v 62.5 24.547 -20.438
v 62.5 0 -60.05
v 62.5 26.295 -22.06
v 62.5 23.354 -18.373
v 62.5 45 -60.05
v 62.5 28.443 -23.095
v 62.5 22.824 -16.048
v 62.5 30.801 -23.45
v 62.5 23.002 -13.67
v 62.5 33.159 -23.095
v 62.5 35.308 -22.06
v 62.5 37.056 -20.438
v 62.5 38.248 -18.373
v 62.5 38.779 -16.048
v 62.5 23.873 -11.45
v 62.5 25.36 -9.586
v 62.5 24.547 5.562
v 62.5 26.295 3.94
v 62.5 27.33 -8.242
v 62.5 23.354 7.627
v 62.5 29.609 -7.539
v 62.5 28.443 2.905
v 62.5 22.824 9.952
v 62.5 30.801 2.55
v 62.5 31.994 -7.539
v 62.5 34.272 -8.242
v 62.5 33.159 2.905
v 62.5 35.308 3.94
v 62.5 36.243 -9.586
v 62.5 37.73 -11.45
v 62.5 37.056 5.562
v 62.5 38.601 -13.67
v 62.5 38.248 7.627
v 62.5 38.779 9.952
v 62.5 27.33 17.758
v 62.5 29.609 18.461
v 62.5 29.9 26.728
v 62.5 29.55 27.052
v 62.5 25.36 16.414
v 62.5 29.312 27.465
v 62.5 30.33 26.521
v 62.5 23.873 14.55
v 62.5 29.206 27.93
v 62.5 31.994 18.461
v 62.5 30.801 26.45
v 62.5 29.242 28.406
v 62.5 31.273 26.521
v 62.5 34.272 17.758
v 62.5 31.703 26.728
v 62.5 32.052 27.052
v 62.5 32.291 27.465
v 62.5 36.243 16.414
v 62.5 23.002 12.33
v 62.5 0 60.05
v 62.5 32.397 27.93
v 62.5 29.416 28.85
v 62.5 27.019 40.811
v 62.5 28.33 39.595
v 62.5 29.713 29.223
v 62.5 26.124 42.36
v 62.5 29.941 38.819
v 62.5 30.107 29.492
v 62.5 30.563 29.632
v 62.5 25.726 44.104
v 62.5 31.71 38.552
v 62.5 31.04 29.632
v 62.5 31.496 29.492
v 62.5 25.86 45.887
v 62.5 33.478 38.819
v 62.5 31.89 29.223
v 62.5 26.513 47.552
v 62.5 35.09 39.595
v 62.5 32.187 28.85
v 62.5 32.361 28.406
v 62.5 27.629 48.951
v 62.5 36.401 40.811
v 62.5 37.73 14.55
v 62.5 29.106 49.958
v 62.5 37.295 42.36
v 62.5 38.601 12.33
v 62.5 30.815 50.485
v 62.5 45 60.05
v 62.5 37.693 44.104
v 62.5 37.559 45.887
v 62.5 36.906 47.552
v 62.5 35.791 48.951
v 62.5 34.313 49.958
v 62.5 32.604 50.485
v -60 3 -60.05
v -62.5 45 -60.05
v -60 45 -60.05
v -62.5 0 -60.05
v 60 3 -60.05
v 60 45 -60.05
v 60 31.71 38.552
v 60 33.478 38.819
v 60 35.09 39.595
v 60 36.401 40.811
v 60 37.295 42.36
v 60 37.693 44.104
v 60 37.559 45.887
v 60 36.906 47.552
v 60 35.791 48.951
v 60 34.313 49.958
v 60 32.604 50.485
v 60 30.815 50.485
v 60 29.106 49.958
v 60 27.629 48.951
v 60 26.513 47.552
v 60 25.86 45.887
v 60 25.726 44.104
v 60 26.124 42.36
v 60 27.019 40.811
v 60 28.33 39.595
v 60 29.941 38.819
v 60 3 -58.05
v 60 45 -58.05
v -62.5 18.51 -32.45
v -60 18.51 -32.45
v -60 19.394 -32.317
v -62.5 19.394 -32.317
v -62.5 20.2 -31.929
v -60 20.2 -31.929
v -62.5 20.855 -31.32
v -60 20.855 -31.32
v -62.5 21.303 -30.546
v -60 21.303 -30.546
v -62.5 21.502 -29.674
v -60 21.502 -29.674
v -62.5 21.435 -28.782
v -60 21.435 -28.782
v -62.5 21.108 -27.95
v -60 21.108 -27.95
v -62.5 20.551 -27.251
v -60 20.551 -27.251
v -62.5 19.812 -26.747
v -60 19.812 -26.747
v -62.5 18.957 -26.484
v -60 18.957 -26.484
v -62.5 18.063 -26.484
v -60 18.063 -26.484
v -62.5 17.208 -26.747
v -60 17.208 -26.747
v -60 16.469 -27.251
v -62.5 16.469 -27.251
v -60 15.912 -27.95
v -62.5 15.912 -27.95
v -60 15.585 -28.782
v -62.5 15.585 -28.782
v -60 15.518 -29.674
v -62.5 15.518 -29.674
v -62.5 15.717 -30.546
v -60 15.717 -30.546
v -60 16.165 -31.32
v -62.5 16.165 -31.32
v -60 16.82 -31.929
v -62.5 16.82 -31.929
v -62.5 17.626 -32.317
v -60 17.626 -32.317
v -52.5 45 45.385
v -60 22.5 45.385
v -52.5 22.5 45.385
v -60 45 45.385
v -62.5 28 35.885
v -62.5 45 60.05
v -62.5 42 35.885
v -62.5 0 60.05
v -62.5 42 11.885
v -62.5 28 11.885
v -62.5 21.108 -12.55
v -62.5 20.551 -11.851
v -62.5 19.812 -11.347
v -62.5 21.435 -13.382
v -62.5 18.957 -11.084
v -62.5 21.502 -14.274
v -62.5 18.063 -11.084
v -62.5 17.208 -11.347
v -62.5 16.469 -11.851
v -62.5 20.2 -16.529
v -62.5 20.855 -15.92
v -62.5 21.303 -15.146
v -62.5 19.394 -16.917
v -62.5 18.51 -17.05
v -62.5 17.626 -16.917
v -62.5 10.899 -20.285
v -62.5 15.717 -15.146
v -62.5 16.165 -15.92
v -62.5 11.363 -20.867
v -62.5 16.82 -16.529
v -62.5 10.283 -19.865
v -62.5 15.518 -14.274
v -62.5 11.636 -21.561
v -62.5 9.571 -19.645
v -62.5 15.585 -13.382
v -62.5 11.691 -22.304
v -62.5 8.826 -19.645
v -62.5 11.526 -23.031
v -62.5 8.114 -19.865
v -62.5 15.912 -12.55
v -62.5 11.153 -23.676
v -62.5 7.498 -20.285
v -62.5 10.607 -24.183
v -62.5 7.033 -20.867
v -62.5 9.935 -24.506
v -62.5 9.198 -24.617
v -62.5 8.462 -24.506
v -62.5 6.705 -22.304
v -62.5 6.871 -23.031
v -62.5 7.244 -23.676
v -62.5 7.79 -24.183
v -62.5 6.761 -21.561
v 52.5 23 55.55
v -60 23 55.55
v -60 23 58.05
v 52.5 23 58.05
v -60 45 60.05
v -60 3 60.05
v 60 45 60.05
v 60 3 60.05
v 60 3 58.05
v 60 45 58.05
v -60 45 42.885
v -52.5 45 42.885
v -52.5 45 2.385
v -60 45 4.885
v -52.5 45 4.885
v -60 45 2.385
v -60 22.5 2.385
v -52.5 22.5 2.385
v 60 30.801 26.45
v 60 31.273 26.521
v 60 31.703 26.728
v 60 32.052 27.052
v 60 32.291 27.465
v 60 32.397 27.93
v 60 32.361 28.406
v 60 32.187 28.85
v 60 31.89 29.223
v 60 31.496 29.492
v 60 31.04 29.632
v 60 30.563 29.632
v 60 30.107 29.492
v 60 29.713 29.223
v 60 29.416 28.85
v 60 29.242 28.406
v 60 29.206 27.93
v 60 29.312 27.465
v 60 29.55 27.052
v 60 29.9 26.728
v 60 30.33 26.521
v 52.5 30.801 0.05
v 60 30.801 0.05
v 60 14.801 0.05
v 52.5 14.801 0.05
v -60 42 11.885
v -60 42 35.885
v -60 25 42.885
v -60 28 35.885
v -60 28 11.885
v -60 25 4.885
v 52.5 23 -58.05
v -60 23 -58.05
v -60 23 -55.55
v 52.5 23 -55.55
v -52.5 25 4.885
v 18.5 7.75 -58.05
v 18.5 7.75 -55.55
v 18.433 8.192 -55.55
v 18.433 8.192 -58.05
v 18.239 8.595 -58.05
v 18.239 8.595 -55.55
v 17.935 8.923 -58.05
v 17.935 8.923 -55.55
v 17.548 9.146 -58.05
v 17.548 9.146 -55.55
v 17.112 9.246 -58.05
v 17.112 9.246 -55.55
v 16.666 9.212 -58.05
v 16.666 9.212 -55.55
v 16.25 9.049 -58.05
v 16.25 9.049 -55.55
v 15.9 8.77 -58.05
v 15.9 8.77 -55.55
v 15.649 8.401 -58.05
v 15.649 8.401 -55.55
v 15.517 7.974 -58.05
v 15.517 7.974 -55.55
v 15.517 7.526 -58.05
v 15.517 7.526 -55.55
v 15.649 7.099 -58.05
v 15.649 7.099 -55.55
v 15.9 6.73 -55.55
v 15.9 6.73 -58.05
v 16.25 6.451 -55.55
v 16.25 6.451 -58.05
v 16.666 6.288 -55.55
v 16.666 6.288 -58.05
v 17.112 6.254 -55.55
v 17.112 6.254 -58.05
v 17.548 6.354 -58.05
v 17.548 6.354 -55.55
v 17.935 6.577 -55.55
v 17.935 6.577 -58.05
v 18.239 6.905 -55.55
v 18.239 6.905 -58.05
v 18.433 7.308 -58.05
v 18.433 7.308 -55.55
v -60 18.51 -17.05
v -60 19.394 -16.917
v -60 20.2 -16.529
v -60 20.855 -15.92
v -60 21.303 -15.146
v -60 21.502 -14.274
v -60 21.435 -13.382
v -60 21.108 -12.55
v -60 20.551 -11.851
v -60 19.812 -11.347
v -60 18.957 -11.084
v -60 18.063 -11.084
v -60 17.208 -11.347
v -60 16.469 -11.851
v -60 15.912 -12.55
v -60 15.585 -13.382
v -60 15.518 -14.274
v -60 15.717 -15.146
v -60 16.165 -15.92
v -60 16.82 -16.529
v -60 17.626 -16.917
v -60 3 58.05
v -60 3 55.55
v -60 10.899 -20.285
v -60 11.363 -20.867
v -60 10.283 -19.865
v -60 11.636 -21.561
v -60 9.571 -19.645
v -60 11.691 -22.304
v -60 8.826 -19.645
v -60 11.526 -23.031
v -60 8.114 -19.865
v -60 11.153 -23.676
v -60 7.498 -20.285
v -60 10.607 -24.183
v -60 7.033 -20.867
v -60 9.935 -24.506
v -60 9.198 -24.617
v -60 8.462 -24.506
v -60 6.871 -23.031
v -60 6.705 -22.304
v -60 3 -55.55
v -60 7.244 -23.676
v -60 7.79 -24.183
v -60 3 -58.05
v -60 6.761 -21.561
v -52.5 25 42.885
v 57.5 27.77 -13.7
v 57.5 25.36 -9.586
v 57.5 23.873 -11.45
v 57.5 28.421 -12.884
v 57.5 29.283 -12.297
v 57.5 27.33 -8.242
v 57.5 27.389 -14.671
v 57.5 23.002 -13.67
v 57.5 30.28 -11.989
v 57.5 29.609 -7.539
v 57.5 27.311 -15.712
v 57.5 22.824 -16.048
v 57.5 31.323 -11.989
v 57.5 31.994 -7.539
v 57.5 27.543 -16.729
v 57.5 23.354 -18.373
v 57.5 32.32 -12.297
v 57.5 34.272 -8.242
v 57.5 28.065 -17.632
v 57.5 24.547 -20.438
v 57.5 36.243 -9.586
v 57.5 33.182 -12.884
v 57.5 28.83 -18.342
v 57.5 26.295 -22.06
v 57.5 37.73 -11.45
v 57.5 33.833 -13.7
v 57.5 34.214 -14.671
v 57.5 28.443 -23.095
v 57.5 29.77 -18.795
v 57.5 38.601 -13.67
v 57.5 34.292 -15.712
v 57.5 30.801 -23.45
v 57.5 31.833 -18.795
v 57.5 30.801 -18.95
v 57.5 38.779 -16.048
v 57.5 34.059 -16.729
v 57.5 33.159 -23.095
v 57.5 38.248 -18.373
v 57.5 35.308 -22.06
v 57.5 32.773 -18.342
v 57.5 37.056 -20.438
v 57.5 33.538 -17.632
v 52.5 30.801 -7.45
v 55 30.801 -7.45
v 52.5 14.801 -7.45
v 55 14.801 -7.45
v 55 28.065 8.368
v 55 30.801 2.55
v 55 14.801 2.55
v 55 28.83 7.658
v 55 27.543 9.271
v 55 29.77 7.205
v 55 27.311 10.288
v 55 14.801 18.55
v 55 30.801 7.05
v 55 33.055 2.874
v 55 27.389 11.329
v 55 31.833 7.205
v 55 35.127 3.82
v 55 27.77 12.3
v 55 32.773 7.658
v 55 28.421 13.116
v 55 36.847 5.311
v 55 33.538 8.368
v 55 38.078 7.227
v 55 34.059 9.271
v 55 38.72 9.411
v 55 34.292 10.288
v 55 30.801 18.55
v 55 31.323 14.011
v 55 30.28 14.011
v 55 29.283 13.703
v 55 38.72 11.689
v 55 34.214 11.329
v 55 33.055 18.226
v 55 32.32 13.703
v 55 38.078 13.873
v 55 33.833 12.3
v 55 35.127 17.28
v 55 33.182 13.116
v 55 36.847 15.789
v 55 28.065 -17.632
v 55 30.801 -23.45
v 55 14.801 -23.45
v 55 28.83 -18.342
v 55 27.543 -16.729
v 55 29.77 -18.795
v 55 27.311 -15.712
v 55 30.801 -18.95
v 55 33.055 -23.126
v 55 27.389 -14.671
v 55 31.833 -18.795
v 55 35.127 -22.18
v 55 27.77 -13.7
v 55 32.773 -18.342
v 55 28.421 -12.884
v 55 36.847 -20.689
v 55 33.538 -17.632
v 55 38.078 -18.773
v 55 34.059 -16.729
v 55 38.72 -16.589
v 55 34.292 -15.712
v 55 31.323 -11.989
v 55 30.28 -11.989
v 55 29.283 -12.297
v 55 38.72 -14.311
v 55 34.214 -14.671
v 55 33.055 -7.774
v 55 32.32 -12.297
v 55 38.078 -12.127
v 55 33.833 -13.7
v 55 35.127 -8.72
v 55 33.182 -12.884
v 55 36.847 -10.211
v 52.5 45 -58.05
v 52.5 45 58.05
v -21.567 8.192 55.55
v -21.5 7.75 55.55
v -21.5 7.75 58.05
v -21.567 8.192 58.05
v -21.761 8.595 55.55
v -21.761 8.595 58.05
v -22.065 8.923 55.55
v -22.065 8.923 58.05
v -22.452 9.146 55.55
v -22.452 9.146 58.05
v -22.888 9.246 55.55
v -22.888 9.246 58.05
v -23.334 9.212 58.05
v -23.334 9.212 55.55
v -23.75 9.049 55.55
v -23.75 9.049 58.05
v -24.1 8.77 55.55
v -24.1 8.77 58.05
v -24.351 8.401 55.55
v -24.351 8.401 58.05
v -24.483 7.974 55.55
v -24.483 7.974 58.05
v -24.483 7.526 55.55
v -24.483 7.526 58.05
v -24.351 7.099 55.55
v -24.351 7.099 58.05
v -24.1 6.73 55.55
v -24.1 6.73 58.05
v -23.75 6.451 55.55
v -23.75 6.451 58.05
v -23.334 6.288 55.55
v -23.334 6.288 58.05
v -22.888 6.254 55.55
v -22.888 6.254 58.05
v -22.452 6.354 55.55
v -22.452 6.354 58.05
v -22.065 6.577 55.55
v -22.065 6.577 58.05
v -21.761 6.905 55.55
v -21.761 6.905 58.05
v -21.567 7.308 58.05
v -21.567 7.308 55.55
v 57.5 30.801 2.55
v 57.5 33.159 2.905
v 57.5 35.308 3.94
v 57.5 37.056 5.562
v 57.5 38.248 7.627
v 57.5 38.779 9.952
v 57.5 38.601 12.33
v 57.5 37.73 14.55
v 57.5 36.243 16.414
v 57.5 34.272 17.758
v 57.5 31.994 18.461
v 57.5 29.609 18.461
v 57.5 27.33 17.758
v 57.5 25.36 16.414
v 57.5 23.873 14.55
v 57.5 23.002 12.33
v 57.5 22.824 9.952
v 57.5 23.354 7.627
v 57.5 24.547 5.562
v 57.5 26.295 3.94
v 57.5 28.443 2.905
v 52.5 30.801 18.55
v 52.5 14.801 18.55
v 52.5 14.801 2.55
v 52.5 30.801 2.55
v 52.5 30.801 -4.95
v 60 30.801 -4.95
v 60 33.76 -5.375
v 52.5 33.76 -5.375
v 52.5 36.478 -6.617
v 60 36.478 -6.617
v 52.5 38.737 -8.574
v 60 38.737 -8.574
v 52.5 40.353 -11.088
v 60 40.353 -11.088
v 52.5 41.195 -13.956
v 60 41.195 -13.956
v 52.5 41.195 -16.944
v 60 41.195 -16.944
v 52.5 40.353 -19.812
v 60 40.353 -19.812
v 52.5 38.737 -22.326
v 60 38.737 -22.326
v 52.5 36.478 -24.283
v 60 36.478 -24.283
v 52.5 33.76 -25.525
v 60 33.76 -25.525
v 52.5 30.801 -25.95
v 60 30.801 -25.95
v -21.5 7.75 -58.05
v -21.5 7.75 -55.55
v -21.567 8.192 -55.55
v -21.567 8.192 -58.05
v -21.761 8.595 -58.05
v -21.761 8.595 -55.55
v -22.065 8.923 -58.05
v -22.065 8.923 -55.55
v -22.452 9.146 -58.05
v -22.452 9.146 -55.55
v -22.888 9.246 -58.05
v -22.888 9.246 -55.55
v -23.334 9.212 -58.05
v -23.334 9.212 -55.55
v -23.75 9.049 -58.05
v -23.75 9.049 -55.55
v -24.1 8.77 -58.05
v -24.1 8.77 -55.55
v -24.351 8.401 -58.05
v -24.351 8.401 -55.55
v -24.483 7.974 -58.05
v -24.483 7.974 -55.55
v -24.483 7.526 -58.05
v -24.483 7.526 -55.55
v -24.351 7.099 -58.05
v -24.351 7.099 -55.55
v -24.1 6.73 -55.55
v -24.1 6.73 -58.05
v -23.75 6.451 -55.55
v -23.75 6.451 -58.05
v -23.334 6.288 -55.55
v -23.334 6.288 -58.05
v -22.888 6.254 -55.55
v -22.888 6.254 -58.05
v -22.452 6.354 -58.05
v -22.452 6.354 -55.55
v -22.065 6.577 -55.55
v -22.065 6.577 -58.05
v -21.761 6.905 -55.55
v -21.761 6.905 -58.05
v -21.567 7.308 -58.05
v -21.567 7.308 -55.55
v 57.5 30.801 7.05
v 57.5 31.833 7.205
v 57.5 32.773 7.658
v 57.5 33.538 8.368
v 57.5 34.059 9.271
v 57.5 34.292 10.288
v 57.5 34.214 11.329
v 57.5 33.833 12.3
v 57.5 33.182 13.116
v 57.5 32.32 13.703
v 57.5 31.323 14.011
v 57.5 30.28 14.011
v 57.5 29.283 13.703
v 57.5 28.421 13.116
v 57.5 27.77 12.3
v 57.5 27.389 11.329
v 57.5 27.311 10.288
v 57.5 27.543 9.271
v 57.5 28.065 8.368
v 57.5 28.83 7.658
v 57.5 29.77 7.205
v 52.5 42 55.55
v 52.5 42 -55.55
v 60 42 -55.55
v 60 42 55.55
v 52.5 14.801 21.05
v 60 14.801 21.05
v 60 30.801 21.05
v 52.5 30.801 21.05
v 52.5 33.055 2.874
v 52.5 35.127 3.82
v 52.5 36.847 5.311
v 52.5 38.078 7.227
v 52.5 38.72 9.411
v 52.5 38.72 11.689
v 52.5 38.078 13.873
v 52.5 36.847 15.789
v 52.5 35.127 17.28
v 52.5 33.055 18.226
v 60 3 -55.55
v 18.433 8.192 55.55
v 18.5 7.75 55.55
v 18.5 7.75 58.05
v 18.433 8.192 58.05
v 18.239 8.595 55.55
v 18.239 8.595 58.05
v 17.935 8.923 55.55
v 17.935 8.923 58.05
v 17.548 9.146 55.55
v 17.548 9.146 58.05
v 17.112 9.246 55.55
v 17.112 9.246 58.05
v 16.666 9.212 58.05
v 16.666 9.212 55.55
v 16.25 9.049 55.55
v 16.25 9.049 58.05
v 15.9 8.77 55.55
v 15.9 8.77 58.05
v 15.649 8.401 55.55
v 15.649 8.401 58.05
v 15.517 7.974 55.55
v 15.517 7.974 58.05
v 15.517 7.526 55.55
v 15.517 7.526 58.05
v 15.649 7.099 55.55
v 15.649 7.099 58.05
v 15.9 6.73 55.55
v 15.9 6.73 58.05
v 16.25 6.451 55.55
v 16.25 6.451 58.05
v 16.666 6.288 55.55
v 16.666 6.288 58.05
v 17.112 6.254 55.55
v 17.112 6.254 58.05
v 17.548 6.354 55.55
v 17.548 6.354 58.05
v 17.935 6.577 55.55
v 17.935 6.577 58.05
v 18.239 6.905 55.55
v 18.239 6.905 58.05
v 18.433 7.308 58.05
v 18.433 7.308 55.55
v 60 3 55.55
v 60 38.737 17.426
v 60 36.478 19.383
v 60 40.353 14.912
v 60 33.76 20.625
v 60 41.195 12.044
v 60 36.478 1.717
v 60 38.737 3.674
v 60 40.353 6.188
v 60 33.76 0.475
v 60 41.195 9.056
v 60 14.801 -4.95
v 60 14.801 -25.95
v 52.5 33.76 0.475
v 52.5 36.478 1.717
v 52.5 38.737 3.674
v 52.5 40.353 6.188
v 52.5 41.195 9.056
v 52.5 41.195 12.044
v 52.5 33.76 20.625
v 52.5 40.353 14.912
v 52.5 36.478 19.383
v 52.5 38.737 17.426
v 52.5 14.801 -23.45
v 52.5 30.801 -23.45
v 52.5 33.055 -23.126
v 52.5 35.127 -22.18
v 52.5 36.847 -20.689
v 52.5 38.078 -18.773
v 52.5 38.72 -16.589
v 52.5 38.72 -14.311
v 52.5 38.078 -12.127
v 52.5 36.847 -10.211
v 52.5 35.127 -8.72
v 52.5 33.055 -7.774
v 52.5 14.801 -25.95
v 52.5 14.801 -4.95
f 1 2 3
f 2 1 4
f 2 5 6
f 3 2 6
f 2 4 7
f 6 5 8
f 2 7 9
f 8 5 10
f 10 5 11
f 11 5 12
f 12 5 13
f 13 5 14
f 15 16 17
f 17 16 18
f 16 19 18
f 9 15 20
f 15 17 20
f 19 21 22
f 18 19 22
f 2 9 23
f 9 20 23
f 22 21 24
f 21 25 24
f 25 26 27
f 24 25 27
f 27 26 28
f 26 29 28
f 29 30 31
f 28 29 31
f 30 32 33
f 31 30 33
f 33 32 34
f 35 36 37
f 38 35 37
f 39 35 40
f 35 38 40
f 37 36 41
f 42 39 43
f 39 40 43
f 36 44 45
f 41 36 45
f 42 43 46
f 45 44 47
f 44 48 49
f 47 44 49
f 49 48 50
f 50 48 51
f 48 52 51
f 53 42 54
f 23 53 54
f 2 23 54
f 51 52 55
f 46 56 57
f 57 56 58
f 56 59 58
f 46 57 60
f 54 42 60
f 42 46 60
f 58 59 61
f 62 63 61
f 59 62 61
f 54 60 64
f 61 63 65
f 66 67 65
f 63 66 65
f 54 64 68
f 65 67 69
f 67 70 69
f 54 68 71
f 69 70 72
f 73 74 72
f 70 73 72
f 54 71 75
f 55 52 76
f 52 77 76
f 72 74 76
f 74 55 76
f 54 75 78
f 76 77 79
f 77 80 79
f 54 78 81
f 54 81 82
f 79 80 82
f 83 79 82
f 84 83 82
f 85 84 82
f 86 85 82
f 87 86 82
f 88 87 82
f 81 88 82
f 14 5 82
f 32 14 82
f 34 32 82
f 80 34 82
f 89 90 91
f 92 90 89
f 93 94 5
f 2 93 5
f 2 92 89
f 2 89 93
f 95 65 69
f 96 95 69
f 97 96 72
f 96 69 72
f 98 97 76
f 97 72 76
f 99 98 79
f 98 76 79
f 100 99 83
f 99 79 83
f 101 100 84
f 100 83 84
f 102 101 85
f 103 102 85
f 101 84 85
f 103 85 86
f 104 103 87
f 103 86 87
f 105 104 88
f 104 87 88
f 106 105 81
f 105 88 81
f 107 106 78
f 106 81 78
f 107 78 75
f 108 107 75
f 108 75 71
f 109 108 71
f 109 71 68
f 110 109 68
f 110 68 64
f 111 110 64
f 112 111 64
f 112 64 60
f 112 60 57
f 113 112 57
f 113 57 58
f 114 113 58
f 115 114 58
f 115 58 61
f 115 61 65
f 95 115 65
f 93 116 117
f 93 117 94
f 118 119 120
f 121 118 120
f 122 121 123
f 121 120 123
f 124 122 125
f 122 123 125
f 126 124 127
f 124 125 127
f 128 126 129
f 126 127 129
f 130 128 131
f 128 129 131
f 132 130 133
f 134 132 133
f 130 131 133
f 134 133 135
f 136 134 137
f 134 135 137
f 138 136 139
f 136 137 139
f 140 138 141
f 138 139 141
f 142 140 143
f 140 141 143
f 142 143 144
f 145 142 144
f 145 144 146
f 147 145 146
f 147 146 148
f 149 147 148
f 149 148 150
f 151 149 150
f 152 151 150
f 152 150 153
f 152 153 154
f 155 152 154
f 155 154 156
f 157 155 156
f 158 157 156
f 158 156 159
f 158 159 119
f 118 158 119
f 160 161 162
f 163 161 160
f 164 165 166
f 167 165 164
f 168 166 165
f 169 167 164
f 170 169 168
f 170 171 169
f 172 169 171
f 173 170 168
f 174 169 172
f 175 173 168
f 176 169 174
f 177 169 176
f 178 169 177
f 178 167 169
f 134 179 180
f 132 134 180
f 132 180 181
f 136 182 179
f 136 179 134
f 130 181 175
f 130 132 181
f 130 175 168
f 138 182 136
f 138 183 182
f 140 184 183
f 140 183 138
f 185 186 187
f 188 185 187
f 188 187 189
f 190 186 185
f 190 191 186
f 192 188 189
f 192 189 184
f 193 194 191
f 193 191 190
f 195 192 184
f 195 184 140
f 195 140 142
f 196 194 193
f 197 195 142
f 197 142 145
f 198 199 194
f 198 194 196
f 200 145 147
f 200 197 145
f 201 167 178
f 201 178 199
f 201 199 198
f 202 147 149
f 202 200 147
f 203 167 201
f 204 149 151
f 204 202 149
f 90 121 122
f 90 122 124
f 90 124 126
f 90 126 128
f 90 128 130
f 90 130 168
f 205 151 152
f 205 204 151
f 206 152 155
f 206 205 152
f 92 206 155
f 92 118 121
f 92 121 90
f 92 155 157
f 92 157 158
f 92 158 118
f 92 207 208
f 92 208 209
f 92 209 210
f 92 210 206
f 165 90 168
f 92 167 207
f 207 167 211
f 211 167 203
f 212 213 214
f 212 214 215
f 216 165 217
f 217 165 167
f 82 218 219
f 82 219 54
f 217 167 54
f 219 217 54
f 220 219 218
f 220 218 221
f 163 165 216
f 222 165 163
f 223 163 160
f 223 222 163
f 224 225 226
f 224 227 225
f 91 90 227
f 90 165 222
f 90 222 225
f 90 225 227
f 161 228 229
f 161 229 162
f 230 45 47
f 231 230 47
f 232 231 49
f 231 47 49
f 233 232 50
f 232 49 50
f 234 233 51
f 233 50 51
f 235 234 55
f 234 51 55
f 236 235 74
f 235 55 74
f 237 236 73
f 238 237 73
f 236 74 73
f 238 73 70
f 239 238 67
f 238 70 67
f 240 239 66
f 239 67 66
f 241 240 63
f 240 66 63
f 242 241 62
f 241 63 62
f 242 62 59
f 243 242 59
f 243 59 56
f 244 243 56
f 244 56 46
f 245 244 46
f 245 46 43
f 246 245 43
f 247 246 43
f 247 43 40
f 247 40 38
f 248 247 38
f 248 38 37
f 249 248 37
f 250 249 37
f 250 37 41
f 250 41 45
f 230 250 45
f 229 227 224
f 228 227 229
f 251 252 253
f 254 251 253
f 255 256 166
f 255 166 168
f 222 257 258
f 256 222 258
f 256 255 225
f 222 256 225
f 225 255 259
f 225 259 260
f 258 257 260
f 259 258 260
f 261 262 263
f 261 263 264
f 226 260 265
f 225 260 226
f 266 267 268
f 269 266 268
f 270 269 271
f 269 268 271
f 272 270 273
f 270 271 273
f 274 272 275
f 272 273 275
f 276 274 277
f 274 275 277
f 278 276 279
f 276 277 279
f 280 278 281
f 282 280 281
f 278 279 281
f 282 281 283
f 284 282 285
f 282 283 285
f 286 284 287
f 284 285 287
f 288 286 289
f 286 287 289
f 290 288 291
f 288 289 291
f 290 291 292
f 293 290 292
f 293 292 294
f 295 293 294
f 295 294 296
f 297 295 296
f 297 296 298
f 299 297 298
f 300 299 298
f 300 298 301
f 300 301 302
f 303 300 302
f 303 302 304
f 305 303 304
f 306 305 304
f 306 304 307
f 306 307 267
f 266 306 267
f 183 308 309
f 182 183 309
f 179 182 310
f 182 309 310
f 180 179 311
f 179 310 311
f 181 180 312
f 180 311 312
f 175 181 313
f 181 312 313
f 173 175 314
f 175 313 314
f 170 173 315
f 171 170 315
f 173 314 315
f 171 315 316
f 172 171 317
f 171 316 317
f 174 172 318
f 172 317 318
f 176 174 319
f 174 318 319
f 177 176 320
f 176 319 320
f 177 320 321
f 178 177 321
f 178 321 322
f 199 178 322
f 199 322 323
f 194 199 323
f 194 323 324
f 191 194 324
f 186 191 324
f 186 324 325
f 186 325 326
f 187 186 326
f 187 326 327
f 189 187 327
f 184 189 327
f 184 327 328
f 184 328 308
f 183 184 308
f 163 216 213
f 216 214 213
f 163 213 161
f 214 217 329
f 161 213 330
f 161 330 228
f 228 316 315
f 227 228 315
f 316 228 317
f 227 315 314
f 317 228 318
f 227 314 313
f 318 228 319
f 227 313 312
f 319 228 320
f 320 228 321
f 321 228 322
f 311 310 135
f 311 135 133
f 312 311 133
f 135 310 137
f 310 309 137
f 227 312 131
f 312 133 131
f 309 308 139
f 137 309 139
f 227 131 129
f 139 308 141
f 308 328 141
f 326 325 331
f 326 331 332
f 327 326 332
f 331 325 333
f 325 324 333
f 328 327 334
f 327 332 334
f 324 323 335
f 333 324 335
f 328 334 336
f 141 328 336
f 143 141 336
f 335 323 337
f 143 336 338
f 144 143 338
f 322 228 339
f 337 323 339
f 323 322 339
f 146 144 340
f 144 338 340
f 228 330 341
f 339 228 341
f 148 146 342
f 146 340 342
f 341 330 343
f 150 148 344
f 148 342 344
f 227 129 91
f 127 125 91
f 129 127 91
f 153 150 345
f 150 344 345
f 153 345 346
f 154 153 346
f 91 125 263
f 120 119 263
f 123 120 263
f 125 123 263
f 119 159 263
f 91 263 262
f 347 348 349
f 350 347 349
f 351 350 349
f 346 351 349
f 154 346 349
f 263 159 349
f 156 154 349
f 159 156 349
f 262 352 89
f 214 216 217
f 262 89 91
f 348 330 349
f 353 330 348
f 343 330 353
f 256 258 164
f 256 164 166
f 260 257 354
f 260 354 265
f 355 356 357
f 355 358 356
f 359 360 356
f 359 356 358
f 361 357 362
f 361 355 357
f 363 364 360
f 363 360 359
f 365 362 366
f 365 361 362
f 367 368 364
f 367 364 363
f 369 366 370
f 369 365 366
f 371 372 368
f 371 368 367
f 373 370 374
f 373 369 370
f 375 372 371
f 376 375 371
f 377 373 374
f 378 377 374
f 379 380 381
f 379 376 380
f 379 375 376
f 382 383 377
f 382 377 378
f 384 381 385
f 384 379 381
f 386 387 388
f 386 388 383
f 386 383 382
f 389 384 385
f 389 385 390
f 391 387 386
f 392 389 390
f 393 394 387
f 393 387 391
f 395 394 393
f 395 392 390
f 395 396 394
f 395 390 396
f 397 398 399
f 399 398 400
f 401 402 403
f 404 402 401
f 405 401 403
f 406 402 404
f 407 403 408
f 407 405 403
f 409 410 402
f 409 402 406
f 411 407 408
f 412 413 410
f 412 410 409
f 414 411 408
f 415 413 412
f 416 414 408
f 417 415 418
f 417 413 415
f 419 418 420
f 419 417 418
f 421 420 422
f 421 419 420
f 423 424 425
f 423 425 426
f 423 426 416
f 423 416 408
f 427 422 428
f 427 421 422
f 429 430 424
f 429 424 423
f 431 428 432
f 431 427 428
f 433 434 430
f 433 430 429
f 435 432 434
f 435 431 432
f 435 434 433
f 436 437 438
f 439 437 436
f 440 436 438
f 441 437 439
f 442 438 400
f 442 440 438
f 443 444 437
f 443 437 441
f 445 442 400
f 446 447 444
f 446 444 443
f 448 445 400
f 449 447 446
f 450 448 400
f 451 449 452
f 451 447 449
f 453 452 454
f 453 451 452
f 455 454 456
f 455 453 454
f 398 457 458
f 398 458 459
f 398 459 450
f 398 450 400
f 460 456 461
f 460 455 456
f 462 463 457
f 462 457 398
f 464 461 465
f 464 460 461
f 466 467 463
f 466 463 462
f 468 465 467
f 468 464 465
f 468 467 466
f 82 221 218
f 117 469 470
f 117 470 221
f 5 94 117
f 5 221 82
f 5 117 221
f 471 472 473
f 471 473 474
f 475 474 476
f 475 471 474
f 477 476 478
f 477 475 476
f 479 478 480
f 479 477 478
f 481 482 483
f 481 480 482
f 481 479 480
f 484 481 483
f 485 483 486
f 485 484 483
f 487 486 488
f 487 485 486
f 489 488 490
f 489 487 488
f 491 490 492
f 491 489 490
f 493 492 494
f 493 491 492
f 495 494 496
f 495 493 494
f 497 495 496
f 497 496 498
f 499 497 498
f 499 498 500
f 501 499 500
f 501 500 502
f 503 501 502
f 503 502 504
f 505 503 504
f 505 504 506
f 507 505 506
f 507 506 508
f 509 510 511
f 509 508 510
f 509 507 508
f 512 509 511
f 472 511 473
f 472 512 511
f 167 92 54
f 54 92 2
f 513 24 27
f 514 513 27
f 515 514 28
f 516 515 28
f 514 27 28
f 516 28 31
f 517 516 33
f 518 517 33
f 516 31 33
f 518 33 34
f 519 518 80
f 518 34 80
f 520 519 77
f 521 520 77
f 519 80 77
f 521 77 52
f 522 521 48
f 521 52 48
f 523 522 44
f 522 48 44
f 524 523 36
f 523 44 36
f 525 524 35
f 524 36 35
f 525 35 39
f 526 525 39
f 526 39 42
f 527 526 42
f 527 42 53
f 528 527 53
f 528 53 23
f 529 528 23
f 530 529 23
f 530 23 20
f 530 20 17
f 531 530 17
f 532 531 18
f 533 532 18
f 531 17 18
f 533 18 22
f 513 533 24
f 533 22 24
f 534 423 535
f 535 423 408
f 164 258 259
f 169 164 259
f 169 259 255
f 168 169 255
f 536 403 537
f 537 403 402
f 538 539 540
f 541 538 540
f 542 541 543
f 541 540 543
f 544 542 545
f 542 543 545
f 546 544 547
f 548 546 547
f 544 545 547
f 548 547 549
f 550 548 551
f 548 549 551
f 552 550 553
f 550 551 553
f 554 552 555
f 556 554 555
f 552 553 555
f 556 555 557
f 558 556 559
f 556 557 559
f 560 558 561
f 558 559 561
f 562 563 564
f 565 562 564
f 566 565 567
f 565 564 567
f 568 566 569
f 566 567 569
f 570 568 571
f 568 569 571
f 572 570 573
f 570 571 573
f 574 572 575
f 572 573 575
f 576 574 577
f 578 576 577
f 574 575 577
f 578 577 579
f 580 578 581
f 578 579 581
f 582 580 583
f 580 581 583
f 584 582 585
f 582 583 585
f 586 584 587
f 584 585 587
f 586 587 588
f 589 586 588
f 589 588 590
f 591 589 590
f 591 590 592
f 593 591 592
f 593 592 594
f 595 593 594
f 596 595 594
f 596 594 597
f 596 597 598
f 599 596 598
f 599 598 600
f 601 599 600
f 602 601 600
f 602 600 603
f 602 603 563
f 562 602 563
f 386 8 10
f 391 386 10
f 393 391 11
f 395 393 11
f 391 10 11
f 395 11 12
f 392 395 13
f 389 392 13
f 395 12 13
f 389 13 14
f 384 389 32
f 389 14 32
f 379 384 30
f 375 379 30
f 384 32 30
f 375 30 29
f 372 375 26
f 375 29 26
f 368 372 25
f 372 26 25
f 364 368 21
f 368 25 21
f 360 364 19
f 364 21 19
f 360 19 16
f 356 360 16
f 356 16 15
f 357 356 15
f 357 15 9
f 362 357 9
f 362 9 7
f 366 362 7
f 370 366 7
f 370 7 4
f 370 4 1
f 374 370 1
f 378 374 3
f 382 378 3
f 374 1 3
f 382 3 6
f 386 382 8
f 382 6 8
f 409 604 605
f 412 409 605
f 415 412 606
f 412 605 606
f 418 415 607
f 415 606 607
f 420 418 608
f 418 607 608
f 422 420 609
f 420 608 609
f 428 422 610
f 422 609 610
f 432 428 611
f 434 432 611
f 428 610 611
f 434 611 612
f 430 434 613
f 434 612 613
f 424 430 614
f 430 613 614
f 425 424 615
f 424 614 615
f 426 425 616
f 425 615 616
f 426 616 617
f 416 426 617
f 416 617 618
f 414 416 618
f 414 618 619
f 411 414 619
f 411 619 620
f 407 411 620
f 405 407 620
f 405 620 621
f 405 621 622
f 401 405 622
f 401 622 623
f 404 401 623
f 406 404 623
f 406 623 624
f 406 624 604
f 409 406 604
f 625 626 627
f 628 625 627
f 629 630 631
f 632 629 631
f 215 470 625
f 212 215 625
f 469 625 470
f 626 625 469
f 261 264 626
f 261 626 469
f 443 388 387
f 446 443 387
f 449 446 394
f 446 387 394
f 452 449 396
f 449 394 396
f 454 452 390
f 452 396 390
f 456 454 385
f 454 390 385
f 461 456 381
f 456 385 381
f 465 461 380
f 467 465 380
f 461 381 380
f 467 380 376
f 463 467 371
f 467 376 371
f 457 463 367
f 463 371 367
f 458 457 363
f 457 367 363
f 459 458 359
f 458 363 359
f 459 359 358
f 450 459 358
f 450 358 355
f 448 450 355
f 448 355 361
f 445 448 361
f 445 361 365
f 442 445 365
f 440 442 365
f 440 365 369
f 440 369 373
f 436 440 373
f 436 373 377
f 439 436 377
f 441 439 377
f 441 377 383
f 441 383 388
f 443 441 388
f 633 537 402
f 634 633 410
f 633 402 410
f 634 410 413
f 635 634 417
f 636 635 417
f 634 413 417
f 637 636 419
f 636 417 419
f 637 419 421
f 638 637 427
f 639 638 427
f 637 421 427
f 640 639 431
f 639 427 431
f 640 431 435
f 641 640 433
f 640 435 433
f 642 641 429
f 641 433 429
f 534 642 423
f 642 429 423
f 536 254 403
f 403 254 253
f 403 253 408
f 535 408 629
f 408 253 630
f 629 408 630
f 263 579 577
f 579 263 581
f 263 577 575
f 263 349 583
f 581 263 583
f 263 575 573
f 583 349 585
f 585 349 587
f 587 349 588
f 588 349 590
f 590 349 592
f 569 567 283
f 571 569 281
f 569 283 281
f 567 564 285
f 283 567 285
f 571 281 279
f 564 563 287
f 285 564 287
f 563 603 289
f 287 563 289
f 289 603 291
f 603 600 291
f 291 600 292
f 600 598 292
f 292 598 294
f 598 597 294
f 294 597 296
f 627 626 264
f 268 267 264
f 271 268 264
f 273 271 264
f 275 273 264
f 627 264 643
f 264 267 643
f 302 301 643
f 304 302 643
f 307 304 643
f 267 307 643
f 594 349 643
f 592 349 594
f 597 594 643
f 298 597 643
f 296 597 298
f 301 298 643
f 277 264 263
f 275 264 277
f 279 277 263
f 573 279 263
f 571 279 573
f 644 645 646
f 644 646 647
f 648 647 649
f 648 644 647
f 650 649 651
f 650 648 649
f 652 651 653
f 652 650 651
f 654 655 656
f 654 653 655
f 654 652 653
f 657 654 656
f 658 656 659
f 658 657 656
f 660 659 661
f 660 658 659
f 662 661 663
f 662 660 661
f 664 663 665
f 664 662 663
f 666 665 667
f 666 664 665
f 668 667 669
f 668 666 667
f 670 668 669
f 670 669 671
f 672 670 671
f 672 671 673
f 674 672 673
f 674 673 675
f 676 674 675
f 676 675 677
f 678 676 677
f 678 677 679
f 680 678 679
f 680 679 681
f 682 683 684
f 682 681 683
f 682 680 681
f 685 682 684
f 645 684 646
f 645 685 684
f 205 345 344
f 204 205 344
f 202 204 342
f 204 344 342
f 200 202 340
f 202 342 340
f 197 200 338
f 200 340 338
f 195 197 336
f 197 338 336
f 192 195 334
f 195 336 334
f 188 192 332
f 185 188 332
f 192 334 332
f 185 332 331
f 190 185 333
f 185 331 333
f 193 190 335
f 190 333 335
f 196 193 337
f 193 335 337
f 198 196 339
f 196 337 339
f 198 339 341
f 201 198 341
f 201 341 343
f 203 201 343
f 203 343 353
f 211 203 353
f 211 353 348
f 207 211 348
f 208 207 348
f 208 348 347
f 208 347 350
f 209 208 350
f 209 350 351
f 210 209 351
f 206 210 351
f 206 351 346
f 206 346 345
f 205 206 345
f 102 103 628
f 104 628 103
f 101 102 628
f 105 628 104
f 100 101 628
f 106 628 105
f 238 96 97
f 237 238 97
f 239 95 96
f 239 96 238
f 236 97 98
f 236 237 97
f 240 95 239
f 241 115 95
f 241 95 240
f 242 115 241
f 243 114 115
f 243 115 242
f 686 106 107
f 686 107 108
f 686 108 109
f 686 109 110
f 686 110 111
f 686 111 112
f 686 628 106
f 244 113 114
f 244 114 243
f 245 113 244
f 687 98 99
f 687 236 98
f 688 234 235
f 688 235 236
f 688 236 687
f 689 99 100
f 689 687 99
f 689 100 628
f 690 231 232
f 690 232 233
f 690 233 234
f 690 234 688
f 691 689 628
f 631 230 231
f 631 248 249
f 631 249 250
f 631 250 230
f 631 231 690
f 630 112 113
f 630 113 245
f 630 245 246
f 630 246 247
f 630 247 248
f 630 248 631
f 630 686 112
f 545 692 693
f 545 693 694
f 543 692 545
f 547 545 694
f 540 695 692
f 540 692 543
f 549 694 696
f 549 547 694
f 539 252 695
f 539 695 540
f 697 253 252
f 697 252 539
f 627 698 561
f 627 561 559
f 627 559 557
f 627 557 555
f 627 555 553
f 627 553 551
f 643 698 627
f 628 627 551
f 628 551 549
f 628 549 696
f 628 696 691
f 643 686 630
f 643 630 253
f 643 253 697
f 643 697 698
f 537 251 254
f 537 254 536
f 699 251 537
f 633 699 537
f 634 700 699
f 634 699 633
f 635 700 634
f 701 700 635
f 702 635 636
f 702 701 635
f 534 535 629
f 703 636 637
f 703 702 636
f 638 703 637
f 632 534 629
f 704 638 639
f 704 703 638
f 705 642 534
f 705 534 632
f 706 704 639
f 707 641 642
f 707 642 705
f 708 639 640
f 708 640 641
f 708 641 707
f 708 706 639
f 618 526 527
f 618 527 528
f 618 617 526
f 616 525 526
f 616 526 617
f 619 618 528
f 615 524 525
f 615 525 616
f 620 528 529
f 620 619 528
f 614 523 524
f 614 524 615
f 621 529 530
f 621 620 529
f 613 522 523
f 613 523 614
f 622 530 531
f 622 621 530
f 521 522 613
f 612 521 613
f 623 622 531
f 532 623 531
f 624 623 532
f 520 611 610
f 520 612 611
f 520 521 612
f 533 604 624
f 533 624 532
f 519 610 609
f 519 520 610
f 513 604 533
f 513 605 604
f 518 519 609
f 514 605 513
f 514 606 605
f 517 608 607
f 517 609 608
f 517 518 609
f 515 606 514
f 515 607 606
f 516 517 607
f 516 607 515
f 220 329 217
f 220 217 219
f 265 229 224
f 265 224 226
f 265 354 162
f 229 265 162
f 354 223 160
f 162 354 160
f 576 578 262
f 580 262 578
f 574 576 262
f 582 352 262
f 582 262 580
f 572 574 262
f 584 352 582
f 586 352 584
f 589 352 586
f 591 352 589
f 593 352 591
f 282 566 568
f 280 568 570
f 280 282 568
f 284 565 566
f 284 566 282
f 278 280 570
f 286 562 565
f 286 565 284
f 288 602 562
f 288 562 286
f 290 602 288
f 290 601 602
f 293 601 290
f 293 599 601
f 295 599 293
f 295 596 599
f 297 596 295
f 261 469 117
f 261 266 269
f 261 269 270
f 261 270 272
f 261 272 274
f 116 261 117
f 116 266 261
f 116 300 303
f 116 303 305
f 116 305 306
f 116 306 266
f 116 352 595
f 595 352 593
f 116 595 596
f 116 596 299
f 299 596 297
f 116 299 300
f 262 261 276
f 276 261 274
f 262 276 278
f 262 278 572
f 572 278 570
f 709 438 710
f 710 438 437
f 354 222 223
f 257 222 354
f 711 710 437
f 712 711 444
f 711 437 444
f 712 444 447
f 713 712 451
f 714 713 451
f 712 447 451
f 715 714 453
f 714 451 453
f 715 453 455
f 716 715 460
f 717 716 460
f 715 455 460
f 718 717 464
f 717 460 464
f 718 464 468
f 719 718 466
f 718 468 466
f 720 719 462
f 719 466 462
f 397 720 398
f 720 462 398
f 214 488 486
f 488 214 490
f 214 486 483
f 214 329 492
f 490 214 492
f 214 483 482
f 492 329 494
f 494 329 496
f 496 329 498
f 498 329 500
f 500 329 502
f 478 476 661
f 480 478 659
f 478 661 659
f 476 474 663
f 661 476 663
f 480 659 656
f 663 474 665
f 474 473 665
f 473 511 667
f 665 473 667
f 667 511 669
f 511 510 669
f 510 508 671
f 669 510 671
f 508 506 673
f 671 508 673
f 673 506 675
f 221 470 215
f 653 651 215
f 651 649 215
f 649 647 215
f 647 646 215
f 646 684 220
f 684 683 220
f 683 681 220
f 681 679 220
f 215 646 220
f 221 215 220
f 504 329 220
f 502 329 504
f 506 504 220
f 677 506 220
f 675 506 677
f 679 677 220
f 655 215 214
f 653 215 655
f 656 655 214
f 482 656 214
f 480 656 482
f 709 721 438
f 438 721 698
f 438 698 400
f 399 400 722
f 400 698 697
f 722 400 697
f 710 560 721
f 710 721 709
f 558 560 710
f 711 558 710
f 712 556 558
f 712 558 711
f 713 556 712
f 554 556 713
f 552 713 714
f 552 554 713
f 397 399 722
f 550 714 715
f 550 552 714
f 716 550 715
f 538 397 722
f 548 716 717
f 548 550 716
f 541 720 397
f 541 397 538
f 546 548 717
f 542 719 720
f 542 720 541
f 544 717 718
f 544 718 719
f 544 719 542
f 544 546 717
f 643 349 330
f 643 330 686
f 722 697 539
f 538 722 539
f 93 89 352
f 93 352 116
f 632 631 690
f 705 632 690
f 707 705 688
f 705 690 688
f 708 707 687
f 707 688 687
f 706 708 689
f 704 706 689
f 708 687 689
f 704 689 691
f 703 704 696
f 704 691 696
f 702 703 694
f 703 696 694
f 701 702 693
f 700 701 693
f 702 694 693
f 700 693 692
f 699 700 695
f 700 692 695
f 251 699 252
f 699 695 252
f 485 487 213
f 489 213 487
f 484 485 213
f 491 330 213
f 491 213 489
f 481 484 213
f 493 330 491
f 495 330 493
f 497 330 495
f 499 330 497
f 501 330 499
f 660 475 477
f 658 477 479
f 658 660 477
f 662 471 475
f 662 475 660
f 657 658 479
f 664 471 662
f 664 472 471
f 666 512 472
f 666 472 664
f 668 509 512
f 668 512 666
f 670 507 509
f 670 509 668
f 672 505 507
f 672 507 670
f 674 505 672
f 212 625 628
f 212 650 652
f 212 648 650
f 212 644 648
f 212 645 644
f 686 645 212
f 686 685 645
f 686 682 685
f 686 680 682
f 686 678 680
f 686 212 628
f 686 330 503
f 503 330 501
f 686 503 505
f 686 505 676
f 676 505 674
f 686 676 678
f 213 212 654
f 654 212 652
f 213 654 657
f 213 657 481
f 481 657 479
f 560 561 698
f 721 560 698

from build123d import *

# Parameters (mm, degrees)
SKETCH2_W                = 125
SKETCH2_H                = 120.1
BOSS_EXTRUDE1_DEPTH      = 45
SKETCH3_W                = 120
SKETCH3_H                = 111.1
CUT_EXTRUDE1_DEPTH       = 39
SKETCH4_W                = 120
SKETCH4_H                = 2
CUT_EXTRUDE3_DEPTH       = 43
LPATTERN1_COUNT          = 2
LPATTERN1_PITCH          = 118.1
SKETCH9_W                = 112.5
SKETCH9_H                = 116.1
CUT_EXTRUDE6_DEPTH       = 23
SKETCH11_R               = 3
CUT_EXTRUDE7_DEPTH       = 3.5
SKETCH15_R               = 2.5
CUT_EXTRUDE9_DEPTH       = 3.5
SKETCH13_W               = 24
SKETCH13_H               = 14
CUT_EXTRUDE10_DEPTH      = 3.5
BOSS_EXTRUDE3_DEPTH      = 7.5
BOSS_EXTRUDE4_DEPTH      = 10
LPATTERN3_COUNT          = 2
LPATTERN3_PITCH          = 26
SKETCH22_R               = 3.5
CUT_EXTRUDE11_DEPTH      = 10
LPATTERN4_COUNT          = 2
LPATTERN4_PITCH          = 26
SKETCH23_R               = 1.6
CUT_EXTRUDE12_DEPTH      = 10
SKETCH26_R               = 3.5
BOSS_EXTRUDE10_DEPTH     = 7.5
LPATTERN9_COUNT          = 2
LPATTERN9_PITCH          = 26
SKETCH27_R               = 6
CUT_EXTRUDE13_DEPTH      = 7.5
SKETCH28_R               = 1.5
CUT_EXTRUDE14_DEPTH      = 61.05
CUT_EXTRUDE14_DEPTH_BACK = 61.05
SKETCH30_R               = 8
CUT_EXTRUDE15_DEPTH      = 5
LPATTERN10_COUNT         = 2
LPATTERN10_PITCH         = 26


with BuildPart() as part:
    # Sketch2 → Boss-Extrude1 (new body)
    with BuildSketch(Plane(origin=(0, 0, 0), x_dir=(1, 0, 0), z_dir=(0, 1, 0))):
        Rectangle(SKETCH2_W, SKETCH2_H)
    extrude(amount=BOSS_EXTRUDE1_DEPTH)

    # Sketch3 → Cut-Extrude1 (cut)
    with BuildSketch(Plane(origin=(0, 3, 0), x_dir=(1, 0, 0), z_dir=(0, 1, 0))):
        Rectangle(SKETCH3_W, SKETCH3_H)
    extrude(amount=CUT_EXTRUDE1_DEPTH, mode=Mode.SUBTRACT)

    # Sketch4 → Cut-Extrude3 (cut, through all)
    with BuildSketch(Plane(origin=(0, 3, 0), x_dir=(1, 0, 0), z_dir=(0, 1, 0))):
        with Locations((0, -59.05)):
            Rectangle(SKETCH4_W, SKETCH4_H)
    cut_extrude3 = extrude(amount=CUT_EXTRUDE3_DEPTH, mode=Mode.SUBTRACT)

    # LPattern1: Cut-Extrude3 ×2
    with Locations(*[(0, 0, -i * LPATTERN1_PITCH) for i in range(1, LPATTERN1_COUNT)]):
        add(cut_extrude3, mode=Mode.SUBTRACT)

    # Sketch9 → Cut-Extrude6 (cut, through all)
    with BuildSketch(Plane(origin=(0, 23, 0), x_dir=(1, 0, 0), z_dir=(0, 1, 0))):
        with Locations((-3.75, 0)):
            Rectangle(SKETCH9_W, SKETCH9_H)
    extrude(amount=CUT_EXTRUDE6_DEPTH, mode=Mode.SUBTRACT)

    # Sketch11 → Cut-Extrude7 (cut, through all)
    with BuildSketch(Plane(origin=(-60, 0, 0), x_dir=(0, 0, -1), z_dir=(1, 0, 0))):
        with Locations((29.45, 18.51)):
            Circle(SKETCH11_R)
        with Locations((14.05, 18.51)):
            Circle(SKETCH11_R)
    extrude(amount=-CUT_EXTRUDE7_DEPTH, mode=Mode.SUBTRACT)

    # Sketch15 → Cut-Extrude9 (cut, through all)
    with BuildSketch(Plane(origin=(-60, 0, 0), x_dir=(0, 0, -1), z_dir=(1, 0, 0))):
        with Locations((22.117427494, 9.198406991)):
            Circle(SKETCH15_R)
    extrude(amount=-CUT_EXTRUDE9_DEPTH, mode=Mode.SUBTRACT)

    # Sketch13 → Cut-Extrude10 (cut, through all)
    with BuildSketch(Plane(origin=(-60, 0, 0), x_dir=(0, 0, -1), z_dir=(1, 0, 0))):
        with Locations((-23.885447562, 35)):
            Rectangle(SKETCH13_W, SKETCH13_H)
    extrude(amount=-CUT_EXTRUDE10_DEPTH, mode=Mode.SUBTRACT)

    # Sketch17 → Boss-Extrude3 (add)
    with BuildSketch(Plane(origin=(-60, 0, 0), x_dir=(0, 0, -1), z_dir=(1, 0, 0))):
        Polygon((-42.885447562, 45), (-42.885447562, 25), (-4.885447562, 25), (-4.885447562, 45), (-2.385447562, 45), (-2.385447562, 22.5), (-45.385447562, 22.5), (-45.385447562, 45), align=None)
    extrude(amount=BOSS_EXTRUDE3_DEPTH)

    # Sketch18 → Boss-Extrude4 (add)
    with BuildSketch(Plane(origin=(62.5, 0, 0), x_dir=(0, 0, -1), z_dir=(1, 0, 0))):
        with BuildLine():
            Line((7.45, 30.801411804), (7.45, 14.801411804))
            Line((7.45, 14.801411804), (4.95, 14.801411804))
            Line((4.95, 14.801411804), (4.95, 30.801411804))
            ThreePointArc((4.95, 30.801411804), (15.45, 41.301411804), (25.95, 30.801411804))
            Line((25.95, 30.801411804), (25.95, 14.801411804))
            Line((25.95, 14.801411804), (23.45, 14.801411804))
            Line((23.45, 14.801411804), (23.45, 30.801411804))
            ThreePointArc((23.45, 30.801411804), (15.45, 38.801411804), (7.45, 30.801411804))
        make_face()
    boss_extrude4 = extrude(amount=-BOSS_EXTRUDE4_DEPTH)

    # LPattern3: Boss-Extrude4 ×2
    with Locations(*[(0, 0, i * LPATTERN3_PITCH) for i in range(1, LPATTERN3_COUNT)]):
        add(boss_extrude4)

    # Sketch22 → Cut-Extrude11 (cut)
    with BuildSketch(Plane(origin=(62.5, 0, 0), x_dir=(0, 0, -1), z_dir=(1, 0, 0))):
        with Locations((15.45, 30.801411804)):
            Circle(SKETCH22_R)
    cut_extrude11 = extrude(amount=-CUT_EXTRUDE11_DEPTH, mode=Mode.SUBTRACT)

    # LPattern4: Cut-Extrude11 ×2
    with Locations(*[(0, 0, i * LPATTERN4_PITCH) for i in range(1, LPATTERN4_COUNT)]):
        add(cut_extrude11, mode=Mode.SUBTRACT)

    # Sketch23 → Cut-Extrude12 (cut)
    with BuildSketch(Plane(origin=(62.5, 0, 0), x_dir=(0, 0, -1), z_dir=(1, 0, 0))):
        with Locations((-28.05, 30.801411804)):
            Circle(SKETCH23_R)
    extrude(amount=-CUT_EXTRUDE12_DEPTH, mode=Mode.SUBTRACT)

    # Sketch26 → Boss-Extrude10 (add)
    with BuildSketch(Plane(origin=(62.5, 0, 0), x_dir=(0, 0, -1), z_dir=(1, 0, 0))):
        with BuildLine():
            Line((23.45, 14.801411804), (7.45, 14.801411804))
            Line((7.45, 14.801411804), (7.45, 30.801411804))
            ThreePointArc((7.45, 30.801411804), (15.45, 38.801411804), (23.45, 30.801411804))
            Line((23.45, 30.801411804), (23.45, 14.801411804))
        make_face()
        with Locations((15.45, 30.801411804)):
            Circle(SKETCH26_R, mode=Mode.SUBTRACT)
    boss_extrude10 = extrude(amount=-BOSS_EXTRUDE10_DEPTH)

    # LPattern9: Boss-Extrude10 ×2
    with Locations(*[(0, 0, i * LPATTERN9_PITCH) for i in range(1, LPATTERN9_COUNT)]):
        add(boss_extrude10)

    # Sketch27 → Cut-Extrude13 (cut)
    with BuildSketch(Plane(origin=(62.5, 0, 0), x_dir=(0, 0, -1), z_dir=(1, 0, 0))):
        with Locations((-44.552239633, 31.709599536)):
            Circle(SKETCH27_R)
    extrude(amount=-CUT_EXTRUDE13_DEPTH, mode=Mode.SUBTRACT)

    # Sketch28 → Cut-Extrude14 (cut, two sides)
    with BuildSketch(Plane.XY) as cut_extrude14_sk:
        with Locations((-23, 7.75)):
            Circle(SKETCH28_R)
        with Locations((17, 7.75)):
            Circle(SKETCH28_R)
    extrude(amount=CUT_EXTRUDE14_DEPTH, mode=Mode.SUBTRACT)
    extrude(cut_extrude14_sk.sketch, amount=-CUT_EXTRUDE14_DEPTH_BACK, mode=Mode.SUBTRACT)

    # Sketch30 → Cut-Extrude15 (cut)
    with BuildSketch(Plane(origin=(62.5, 0, 0), x_dir=(0, 0, -1), z_dir=(1, 0, 0))):
        with Locations((15.45, 30.801411804)):
            Circle(SKETCH30_R)
    cut_extrude15 = extrude(amount=-CUT_EXTRUDE15_DEPTH, mode=Mode.SUBTRACT)

    # LPattern10: Cut-Extrude15 ×2
    with Locations(*[(0, 0, i * LPATTERN10_PITCH) for i in range(1, LPATTERN10_COUNT)]):
        add(cut_extrude15, mode=Mode.SUBTRACT)


solid = part.part
